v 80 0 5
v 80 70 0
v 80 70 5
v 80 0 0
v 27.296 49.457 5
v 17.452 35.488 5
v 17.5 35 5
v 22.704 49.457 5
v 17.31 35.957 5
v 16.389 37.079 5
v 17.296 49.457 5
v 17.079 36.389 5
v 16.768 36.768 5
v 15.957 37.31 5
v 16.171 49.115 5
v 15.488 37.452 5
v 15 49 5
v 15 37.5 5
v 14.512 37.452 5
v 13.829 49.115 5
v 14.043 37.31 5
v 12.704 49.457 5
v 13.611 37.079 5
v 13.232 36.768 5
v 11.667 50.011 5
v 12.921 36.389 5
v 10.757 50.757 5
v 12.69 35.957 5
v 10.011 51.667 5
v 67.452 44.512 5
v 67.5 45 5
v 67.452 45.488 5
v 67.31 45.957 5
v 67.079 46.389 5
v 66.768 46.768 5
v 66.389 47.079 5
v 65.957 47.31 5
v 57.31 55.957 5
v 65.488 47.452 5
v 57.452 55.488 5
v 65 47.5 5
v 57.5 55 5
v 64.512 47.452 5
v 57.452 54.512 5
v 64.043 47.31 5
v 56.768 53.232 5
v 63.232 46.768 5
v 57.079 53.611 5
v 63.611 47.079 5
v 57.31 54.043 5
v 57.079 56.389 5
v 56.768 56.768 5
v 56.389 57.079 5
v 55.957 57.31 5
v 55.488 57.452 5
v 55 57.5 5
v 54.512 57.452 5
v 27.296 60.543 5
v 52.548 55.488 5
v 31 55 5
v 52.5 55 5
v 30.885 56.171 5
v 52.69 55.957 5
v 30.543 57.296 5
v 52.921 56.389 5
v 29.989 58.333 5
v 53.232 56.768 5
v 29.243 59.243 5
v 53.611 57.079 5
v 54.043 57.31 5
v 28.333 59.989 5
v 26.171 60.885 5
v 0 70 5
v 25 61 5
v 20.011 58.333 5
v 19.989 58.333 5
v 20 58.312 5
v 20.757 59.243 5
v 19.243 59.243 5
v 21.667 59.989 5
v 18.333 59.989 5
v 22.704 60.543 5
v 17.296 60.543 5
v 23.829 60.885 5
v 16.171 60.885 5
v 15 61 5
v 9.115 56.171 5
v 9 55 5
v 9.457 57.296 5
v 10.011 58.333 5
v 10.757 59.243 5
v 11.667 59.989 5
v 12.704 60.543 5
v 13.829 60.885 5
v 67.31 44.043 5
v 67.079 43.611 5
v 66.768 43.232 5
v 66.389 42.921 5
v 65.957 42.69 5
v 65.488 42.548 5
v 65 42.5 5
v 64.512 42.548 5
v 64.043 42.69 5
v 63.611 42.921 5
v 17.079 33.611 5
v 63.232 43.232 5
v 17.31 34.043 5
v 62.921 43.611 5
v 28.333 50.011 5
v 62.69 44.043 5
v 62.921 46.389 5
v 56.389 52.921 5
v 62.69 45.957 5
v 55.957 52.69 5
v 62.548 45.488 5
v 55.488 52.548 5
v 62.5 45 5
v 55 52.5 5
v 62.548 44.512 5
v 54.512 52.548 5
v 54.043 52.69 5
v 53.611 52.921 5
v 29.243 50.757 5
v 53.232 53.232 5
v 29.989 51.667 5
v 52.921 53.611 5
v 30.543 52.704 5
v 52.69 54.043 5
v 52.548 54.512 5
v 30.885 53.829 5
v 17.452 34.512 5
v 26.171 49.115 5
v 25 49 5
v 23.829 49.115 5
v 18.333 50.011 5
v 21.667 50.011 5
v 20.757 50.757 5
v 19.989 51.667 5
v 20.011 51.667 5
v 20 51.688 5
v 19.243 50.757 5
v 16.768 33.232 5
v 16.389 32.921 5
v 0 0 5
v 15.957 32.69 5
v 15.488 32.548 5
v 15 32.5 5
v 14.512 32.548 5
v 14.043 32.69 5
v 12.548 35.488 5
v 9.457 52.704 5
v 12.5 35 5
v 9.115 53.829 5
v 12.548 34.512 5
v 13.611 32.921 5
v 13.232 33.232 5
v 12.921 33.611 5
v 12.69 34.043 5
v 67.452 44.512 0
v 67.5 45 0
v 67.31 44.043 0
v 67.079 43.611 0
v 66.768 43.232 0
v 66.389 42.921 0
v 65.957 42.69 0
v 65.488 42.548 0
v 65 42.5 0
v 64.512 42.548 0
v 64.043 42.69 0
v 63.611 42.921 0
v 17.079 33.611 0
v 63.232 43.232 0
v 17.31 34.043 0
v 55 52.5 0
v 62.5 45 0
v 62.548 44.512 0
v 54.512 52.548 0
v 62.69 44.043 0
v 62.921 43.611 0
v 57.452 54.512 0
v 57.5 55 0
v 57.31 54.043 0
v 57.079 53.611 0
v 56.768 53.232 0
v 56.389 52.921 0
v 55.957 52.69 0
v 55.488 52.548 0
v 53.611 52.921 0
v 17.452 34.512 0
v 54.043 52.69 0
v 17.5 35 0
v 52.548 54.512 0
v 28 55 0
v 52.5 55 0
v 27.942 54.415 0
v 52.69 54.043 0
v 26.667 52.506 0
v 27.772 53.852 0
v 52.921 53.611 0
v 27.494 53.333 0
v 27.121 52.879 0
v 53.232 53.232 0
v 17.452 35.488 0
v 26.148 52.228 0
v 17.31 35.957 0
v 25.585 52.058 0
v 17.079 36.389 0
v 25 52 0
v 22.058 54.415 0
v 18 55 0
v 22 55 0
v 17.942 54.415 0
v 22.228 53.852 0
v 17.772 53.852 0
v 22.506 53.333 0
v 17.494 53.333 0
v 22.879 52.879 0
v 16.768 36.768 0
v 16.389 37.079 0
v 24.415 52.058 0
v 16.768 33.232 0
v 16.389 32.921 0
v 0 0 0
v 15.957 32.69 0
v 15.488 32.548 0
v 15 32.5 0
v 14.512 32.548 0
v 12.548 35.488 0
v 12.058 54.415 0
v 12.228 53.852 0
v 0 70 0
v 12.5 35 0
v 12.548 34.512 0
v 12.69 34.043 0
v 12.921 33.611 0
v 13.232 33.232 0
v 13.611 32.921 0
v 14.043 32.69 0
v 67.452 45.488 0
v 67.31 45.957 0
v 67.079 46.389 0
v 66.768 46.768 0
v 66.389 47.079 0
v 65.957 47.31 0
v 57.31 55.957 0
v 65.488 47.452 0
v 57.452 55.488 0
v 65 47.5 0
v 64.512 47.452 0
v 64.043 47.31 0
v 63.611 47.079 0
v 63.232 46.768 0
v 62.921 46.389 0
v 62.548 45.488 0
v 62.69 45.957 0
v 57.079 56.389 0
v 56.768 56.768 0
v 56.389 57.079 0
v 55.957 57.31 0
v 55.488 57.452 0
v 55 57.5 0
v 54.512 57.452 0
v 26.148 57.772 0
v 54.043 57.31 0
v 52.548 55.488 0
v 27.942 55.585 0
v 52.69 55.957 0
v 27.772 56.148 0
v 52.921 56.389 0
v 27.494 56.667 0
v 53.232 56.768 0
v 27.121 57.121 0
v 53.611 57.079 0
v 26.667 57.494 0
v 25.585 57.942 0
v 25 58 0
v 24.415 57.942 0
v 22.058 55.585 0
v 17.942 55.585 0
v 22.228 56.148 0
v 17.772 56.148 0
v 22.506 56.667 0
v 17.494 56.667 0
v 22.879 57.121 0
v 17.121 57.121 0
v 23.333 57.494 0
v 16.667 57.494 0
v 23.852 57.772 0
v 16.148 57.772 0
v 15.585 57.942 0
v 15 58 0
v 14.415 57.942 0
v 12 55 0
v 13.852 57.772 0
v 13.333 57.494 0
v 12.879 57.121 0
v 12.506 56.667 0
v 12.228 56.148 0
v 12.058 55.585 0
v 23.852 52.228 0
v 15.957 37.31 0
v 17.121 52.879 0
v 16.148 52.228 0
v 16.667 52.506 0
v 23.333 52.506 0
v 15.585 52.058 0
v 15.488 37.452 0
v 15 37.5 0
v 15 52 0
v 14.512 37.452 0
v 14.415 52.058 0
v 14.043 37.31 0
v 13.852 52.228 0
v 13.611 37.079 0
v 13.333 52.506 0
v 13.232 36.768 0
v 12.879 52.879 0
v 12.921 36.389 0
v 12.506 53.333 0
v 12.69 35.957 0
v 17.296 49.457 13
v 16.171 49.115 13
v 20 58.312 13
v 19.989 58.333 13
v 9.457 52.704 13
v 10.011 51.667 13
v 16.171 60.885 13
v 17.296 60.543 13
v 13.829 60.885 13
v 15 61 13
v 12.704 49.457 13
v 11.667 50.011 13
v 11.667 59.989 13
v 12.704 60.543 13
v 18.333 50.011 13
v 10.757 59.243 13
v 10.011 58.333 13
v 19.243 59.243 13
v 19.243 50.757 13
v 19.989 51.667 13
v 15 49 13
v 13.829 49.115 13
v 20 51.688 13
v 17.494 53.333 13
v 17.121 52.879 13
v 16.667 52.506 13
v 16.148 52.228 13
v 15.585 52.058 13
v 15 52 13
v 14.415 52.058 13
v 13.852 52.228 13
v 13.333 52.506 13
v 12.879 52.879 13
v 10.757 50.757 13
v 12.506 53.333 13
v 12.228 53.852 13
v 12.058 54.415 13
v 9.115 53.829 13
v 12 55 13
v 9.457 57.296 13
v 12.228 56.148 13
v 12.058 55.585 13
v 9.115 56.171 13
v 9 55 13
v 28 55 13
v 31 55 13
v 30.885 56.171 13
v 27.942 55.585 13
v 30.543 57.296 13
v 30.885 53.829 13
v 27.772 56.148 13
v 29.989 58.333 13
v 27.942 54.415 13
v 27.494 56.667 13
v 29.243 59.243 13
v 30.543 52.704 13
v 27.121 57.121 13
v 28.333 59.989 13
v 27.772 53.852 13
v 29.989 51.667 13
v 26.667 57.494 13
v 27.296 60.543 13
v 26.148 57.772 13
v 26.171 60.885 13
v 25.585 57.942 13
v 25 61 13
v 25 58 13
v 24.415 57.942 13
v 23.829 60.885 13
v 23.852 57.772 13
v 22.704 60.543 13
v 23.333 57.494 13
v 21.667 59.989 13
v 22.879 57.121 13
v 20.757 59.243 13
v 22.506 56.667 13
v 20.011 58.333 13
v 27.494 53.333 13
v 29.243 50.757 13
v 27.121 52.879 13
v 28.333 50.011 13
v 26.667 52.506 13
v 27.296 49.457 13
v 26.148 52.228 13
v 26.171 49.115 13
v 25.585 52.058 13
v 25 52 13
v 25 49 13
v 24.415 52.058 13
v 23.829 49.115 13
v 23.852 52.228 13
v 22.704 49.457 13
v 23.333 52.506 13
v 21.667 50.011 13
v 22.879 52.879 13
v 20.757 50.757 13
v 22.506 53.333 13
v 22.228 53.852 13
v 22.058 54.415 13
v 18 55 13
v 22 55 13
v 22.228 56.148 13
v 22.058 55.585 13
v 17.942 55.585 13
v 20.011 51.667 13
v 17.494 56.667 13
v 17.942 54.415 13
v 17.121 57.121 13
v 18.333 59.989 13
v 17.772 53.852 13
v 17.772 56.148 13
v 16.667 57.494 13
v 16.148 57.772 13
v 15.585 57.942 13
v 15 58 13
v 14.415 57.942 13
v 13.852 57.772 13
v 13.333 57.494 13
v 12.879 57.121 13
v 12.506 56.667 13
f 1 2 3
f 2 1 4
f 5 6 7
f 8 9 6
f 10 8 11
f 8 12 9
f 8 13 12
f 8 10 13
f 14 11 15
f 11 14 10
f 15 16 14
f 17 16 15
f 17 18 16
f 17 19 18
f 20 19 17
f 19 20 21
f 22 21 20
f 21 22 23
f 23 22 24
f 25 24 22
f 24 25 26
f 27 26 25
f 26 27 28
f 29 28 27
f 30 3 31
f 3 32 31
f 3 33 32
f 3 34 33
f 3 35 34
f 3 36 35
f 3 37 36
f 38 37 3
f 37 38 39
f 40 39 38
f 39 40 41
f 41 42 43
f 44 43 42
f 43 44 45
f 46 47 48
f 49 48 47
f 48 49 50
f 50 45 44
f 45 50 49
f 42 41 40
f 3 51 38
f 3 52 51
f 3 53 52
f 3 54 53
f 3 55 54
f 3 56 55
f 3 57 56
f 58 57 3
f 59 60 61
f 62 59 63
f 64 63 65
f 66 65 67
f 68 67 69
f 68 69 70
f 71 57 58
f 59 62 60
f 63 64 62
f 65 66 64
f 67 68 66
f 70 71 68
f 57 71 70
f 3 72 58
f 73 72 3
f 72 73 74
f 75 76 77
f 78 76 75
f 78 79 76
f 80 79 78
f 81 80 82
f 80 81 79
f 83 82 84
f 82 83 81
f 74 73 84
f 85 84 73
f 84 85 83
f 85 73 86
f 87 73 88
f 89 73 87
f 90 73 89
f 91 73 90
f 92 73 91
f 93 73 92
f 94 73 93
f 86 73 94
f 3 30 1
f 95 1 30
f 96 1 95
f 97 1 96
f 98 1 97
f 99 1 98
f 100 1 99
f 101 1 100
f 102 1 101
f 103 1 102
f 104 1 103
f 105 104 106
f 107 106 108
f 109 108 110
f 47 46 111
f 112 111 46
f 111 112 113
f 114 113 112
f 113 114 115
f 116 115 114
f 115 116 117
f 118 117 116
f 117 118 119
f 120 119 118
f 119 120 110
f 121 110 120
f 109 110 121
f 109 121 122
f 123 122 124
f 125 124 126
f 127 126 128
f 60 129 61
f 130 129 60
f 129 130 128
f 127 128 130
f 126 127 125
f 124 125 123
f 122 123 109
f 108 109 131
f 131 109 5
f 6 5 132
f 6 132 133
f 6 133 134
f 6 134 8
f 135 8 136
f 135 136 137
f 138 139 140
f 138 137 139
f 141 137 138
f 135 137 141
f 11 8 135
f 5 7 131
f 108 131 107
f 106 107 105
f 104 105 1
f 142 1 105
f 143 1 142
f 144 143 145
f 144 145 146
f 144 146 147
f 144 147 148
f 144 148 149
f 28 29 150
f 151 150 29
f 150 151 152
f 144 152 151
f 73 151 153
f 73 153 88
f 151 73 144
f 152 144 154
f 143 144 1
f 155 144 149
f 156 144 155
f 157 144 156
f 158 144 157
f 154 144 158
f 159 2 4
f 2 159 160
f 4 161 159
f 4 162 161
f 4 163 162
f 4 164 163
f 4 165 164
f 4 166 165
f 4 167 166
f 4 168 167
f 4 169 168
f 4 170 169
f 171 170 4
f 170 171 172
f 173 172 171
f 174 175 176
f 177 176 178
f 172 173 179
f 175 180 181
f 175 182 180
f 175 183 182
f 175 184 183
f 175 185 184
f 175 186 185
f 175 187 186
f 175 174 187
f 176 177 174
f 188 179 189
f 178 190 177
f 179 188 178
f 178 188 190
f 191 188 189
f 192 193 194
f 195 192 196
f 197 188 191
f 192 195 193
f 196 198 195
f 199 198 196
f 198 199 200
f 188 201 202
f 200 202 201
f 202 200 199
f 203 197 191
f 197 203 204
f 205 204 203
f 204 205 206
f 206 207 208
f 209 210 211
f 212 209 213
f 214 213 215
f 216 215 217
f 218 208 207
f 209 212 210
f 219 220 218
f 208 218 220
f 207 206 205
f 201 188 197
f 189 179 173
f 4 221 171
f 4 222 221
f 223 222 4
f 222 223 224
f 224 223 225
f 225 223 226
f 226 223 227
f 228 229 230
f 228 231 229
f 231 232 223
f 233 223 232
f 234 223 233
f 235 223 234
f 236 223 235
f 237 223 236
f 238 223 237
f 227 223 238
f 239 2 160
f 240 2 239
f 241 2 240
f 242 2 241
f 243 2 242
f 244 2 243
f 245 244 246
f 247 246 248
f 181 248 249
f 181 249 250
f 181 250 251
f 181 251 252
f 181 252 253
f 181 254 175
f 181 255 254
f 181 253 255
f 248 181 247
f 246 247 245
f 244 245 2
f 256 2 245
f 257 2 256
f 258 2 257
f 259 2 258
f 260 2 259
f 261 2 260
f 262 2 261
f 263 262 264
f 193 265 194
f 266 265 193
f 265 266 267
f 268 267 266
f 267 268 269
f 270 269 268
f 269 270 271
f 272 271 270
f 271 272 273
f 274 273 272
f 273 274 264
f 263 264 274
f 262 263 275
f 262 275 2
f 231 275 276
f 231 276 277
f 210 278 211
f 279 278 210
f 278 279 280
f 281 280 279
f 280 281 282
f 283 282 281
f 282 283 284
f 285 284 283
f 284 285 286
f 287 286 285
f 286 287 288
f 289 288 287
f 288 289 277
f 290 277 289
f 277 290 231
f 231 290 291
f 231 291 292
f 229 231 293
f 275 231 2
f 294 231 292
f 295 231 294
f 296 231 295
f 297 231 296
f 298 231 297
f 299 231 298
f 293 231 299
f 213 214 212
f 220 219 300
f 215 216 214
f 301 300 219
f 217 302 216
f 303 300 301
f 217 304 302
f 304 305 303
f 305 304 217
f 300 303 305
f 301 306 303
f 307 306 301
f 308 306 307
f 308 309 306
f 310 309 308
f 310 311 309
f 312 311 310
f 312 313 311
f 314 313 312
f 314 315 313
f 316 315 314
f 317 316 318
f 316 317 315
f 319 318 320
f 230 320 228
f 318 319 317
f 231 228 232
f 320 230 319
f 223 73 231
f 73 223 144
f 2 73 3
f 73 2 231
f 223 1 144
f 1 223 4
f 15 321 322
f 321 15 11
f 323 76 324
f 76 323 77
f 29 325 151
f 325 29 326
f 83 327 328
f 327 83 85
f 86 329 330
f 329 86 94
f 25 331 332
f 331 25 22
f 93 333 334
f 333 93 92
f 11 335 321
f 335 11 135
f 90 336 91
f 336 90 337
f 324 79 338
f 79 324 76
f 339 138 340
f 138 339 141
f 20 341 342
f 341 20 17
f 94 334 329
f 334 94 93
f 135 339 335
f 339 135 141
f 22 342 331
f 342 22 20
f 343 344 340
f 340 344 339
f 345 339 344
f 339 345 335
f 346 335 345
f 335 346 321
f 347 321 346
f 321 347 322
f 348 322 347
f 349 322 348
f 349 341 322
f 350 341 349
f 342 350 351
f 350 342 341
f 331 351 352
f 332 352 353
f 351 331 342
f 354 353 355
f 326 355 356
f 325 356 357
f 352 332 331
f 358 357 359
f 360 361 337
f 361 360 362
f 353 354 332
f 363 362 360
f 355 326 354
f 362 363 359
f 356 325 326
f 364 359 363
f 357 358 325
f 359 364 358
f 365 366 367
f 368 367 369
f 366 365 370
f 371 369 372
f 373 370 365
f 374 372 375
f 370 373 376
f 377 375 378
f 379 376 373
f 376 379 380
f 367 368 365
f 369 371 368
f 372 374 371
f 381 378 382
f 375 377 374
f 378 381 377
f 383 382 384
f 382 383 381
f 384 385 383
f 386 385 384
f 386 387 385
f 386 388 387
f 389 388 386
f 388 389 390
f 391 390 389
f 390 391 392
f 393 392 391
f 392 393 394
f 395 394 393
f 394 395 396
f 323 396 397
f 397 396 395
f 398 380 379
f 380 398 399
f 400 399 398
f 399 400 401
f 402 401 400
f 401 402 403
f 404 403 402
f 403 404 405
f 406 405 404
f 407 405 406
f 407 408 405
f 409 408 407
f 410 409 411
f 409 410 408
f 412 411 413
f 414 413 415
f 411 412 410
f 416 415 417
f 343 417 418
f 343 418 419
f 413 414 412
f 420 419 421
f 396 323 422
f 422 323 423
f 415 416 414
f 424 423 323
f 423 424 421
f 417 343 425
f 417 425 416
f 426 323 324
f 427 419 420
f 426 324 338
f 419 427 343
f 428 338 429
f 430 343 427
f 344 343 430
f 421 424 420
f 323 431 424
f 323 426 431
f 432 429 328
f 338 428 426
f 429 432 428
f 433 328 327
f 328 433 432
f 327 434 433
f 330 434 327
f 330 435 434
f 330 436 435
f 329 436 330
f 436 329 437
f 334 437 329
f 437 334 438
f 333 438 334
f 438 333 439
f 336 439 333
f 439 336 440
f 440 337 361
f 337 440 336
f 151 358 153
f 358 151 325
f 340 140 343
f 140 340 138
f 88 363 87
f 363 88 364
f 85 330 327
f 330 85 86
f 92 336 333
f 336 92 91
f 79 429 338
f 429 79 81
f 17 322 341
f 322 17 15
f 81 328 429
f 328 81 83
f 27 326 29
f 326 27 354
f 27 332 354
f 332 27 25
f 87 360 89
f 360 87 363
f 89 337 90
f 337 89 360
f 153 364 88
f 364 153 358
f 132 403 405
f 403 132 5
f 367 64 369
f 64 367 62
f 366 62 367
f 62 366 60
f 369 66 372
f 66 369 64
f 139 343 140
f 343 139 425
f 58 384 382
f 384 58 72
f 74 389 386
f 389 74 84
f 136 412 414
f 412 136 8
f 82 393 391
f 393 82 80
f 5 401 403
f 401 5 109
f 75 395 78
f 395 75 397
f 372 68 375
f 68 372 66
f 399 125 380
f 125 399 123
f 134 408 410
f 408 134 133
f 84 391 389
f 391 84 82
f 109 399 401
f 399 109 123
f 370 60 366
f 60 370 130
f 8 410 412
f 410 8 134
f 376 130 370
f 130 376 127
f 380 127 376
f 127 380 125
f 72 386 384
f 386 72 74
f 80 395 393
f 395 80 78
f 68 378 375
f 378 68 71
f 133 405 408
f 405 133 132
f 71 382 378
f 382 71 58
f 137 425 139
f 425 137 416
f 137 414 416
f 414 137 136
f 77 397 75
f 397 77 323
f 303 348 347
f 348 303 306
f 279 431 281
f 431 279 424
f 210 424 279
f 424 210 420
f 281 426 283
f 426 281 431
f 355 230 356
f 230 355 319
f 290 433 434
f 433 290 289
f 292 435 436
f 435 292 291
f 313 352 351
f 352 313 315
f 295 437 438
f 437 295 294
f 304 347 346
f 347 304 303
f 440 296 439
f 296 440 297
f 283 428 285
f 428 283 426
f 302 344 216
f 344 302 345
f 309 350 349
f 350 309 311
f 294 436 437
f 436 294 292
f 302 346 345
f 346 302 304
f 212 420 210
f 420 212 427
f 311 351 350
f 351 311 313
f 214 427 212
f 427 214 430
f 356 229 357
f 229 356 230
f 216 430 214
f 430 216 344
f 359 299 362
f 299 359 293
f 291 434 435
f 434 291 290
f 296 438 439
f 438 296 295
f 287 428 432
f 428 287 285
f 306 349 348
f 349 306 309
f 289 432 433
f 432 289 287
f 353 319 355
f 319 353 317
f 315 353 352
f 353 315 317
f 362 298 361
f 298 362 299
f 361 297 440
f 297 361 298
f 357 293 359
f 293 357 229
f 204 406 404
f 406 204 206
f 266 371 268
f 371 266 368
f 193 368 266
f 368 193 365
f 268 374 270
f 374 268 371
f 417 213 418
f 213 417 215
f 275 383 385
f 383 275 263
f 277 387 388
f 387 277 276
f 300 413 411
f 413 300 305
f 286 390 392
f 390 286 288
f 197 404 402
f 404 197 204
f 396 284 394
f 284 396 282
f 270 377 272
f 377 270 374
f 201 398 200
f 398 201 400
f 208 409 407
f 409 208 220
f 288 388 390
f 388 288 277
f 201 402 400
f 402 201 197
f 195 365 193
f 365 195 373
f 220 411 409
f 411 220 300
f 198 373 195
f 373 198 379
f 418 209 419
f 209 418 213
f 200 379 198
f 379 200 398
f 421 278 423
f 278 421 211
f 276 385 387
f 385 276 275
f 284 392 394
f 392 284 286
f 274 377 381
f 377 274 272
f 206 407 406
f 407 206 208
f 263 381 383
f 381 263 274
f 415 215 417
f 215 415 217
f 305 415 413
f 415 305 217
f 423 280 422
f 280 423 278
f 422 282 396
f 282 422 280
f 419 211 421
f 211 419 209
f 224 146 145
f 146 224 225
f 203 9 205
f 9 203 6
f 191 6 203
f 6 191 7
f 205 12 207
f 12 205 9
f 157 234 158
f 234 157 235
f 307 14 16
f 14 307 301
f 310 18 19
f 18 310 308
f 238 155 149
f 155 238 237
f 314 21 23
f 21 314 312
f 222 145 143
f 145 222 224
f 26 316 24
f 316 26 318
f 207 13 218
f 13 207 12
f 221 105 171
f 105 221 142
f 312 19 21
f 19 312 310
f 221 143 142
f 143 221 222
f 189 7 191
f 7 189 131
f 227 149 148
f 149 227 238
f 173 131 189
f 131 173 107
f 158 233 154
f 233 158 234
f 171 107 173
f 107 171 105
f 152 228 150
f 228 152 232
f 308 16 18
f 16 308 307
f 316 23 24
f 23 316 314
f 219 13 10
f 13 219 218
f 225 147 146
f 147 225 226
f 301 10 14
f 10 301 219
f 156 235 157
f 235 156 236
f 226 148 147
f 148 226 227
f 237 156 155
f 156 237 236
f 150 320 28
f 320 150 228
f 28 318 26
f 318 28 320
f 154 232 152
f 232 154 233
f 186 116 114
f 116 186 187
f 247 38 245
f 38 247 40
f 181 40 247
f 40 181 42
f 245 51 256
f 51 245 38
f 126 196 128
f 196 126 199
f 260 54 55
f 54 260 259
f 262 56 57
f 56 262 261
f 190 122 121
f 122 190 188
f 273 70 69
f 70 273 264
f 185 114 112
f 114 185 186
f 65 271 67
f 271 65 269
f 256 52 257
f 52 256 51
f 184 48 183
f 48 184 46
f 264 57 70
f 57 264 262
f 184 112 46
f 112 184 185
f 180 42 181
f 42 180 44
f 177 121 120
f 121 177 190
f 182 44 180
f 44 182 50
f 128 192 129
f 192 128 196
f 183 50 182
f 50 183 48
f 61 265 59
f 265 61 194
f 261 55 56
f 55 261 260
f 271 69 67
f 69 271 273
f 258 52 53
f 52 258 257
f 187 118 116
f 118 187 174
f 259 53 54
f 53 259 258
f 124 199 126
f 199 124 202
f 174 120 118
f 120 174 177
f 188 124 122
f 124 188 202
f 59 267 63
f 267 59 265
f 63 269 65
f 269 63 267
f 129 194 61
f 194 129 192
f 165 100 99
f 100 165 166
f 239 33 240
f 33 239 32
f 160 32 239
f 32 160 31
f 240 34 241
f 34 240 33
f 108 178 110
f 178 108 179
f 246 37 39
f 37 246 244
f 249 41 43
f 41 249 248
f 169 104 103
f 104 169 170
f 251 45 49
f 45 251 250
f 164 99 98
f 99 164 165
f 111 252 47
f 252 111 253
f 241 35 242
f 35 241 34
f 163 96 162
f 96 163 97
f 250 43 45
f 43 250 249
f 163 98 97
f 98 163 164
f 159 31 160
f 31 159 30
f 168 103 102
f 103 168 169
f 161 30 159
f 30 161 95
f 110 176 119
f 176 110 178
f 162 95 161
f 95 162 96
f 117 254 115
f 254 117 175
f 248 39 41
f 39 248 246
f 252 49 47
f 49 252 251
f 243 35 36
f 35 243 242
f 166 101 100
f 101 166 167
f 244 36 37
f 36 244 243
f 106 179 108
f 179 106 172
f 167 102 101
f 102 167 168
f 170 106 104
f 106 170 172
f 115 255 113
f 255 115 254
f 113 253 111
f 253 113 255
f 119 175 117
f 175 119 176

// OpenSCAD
$fn = 32;

// ----------------------------------------------------------------------
// Mixed field: bosses and holes at given coordinates
// ----------------------------------------------------------------------

// --- parameters (mm) ---
plate_l = 80;             // plate length, X
plate_w = 70;             // plate width, Y
plate_t = 5;              // plate thickness, Z
boss_d = 12;              // boss diameter
boss_h = 8;               // boss height above the plate
hole_d = 5;               // through hole diameter

total_h = plate_t + boss_h;  // overall height

difference() {
  union() {
    cube([plate_l, plate_w, plate_t]);
    translate([15, 55, plate_t]) cylinder(h = boss_h, d = boss_d);
    translate([25, 55, plate_t]) cylinder(h = boss_h, d = boss_d);
  }
  translate([15, 55, -1]) cylinder(h = total_h + 2, d = boss_d / 2);
  translate([25, 55, -1]) cylinder(h = total_h + 2, d = boss_d / 2);
  translate([15, 35, -1]) cylinder(h = plate_t + 2, d = hole_d);
  translate([55, 55, -1]) cylinder(h = plate_t + 2, d = hole_d);
  translate([65, 45, -1]) cylinder(h = plate_t + 2, d = hole_d);
}
